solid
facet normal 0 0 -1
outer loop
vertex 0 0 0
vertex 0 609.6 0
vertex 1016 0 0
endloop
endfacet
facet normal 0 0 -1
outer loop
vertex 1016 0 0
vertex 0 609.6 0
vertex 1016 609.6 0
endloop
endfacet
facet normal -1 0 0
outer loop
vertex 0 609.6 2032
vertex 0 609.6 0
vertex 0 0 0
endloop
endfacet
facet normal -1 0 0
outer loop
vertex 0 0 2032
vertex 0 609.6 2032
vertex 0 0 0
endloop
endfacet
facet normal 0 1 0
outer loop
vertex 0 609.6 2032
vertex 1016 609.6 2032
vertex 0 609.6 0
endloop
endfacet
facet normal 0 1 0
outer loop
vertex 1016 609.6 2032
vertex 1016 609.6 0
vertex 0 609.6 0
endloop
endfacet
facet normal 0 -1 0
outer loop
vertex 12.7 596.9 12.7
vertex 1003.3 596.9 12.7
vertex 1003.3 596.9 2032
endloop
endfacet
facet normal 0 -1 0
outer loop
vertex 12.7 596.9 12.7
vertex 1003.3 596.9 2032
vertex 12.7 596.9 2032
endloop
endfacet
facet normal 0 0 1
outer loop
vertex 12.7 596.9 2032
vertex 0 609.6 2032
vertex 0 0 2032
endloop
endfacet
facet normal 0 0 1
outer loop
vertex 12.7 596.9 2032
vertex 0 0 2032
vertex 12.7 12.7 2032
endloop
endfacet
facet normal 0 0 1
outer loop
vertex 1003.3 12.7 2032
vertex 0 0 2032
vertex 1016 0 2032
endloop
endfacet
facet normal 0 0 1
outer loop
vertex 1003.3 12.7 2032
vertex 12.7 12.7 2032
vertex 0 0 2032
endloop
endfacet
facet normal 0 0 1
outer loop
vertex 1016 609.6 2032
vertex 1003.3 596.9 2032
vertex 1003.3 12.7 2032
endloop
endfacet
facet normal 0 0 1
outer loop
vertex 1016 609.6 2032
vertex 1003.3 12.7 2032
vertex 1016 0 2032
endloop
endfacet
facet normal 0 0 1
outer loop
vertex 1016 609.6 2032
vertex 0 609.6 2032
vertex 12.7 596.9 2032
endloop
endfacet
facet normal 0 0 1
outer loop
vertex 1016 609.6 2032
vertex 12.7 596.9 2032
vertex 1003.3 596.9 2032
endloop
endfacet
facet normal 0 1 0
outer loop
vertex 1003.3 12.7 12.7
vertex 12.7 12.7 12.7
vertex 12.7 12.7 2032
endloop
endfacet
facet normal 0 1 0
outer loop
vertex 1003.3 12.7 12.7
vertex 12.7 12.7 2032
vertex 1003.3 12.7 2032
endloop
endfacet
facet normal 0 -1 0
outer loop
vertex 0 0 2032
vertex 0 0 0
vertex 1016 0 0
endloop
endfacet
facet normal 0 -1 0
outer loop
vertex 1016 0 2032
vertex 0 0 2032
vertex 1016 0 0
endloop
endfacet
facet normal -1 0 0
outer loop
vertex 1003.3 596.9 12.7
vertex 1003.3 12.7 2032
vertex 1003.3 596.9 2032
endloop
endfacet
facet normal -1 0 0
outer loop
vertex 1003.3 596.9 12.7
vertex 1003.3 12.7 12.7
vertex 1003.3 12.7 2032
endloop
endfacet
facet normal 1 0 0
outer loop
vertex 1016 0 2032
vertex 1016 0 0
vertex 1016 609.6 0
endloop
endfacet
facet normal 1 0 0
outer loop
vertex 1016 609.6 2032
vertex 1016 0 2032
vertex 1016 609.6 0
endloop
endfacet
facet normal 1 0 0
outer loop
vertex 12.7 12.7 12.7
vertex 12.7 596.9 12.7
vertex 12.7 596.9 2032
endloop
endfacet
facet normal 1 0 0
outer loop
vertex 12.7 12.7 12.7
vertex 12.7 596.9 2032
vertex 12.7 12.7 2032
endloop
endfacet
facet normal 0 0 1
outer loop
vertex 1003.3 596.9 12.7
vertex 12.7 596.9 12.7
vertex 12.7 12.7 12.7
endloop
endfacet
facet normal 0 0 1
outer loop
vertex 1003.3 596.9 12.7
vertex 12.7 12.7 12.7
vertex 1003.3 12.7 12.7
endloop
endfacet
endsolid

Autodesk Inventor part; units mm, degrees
ref_plane "YZ Plane" through (0, 0, 0) normal (1, 0, 0) x (0, 1, 0)
ref_plane "XZ Plane" through (0, 0, 0) normal (0, 1, 0) x (-1, 0, 0)
sketch "Sketch1" plane through (0, 0, 0) normal (0, 0, 1) x (1, 0, 0)
  line L0 (0, 0) -> (1016, 0)
  line L1 (1016, 0) -> (1016, 609.6)
  line L2 (1016, 609.6) -> (0, 609.6)
  line L3 (0, 609.6) -> (0, 0)
  line L4 (12.7, 12.7) -> (1003.3, 12.7)
  line L5 (1003.3, 12.7) -> (1003.3, 596.9)
  line L6 (1003.3, 596.9) -> (12.7, 596.9)
  line L7 (12.7, 596.9) -> (12.7, 12.7)
  dimension "d0" = 609.6
  dimension "d1" = 1016
  dimension "d2" = 12.7
  dimension "d3" = 12.7
  dimension "d4" = 12.7
  dimension "d5" = 12.7
extrude "Extrusion1" add sketch "Sketch1" along normal blind 2032
extrude "Extrusion2" add sketch "Sketch1" along normal blind 12.7 contours L7 L6 L5 L4
ref_plane "Work Plane1" through (0, 304.8, 0) normal (0, -1, 0) x (1, 0, 0)
equation "\"d0\" = length"
equation "\"d1\" = width"
equation "\"d2\" = thickness"
equation "\"d3\" = thickness"
equation "\"d4\" = thickness"
equation "\"d5\" = thickness"
equation "\"d6\" = height"
equation "\"d8\" = thickness"
equation "\"length\" = 609.6"
equation "\"width\" = 1016"
equation "\"height\" = 2032"
equation "\"thickness\" = 12.7"
properties part number "box"
